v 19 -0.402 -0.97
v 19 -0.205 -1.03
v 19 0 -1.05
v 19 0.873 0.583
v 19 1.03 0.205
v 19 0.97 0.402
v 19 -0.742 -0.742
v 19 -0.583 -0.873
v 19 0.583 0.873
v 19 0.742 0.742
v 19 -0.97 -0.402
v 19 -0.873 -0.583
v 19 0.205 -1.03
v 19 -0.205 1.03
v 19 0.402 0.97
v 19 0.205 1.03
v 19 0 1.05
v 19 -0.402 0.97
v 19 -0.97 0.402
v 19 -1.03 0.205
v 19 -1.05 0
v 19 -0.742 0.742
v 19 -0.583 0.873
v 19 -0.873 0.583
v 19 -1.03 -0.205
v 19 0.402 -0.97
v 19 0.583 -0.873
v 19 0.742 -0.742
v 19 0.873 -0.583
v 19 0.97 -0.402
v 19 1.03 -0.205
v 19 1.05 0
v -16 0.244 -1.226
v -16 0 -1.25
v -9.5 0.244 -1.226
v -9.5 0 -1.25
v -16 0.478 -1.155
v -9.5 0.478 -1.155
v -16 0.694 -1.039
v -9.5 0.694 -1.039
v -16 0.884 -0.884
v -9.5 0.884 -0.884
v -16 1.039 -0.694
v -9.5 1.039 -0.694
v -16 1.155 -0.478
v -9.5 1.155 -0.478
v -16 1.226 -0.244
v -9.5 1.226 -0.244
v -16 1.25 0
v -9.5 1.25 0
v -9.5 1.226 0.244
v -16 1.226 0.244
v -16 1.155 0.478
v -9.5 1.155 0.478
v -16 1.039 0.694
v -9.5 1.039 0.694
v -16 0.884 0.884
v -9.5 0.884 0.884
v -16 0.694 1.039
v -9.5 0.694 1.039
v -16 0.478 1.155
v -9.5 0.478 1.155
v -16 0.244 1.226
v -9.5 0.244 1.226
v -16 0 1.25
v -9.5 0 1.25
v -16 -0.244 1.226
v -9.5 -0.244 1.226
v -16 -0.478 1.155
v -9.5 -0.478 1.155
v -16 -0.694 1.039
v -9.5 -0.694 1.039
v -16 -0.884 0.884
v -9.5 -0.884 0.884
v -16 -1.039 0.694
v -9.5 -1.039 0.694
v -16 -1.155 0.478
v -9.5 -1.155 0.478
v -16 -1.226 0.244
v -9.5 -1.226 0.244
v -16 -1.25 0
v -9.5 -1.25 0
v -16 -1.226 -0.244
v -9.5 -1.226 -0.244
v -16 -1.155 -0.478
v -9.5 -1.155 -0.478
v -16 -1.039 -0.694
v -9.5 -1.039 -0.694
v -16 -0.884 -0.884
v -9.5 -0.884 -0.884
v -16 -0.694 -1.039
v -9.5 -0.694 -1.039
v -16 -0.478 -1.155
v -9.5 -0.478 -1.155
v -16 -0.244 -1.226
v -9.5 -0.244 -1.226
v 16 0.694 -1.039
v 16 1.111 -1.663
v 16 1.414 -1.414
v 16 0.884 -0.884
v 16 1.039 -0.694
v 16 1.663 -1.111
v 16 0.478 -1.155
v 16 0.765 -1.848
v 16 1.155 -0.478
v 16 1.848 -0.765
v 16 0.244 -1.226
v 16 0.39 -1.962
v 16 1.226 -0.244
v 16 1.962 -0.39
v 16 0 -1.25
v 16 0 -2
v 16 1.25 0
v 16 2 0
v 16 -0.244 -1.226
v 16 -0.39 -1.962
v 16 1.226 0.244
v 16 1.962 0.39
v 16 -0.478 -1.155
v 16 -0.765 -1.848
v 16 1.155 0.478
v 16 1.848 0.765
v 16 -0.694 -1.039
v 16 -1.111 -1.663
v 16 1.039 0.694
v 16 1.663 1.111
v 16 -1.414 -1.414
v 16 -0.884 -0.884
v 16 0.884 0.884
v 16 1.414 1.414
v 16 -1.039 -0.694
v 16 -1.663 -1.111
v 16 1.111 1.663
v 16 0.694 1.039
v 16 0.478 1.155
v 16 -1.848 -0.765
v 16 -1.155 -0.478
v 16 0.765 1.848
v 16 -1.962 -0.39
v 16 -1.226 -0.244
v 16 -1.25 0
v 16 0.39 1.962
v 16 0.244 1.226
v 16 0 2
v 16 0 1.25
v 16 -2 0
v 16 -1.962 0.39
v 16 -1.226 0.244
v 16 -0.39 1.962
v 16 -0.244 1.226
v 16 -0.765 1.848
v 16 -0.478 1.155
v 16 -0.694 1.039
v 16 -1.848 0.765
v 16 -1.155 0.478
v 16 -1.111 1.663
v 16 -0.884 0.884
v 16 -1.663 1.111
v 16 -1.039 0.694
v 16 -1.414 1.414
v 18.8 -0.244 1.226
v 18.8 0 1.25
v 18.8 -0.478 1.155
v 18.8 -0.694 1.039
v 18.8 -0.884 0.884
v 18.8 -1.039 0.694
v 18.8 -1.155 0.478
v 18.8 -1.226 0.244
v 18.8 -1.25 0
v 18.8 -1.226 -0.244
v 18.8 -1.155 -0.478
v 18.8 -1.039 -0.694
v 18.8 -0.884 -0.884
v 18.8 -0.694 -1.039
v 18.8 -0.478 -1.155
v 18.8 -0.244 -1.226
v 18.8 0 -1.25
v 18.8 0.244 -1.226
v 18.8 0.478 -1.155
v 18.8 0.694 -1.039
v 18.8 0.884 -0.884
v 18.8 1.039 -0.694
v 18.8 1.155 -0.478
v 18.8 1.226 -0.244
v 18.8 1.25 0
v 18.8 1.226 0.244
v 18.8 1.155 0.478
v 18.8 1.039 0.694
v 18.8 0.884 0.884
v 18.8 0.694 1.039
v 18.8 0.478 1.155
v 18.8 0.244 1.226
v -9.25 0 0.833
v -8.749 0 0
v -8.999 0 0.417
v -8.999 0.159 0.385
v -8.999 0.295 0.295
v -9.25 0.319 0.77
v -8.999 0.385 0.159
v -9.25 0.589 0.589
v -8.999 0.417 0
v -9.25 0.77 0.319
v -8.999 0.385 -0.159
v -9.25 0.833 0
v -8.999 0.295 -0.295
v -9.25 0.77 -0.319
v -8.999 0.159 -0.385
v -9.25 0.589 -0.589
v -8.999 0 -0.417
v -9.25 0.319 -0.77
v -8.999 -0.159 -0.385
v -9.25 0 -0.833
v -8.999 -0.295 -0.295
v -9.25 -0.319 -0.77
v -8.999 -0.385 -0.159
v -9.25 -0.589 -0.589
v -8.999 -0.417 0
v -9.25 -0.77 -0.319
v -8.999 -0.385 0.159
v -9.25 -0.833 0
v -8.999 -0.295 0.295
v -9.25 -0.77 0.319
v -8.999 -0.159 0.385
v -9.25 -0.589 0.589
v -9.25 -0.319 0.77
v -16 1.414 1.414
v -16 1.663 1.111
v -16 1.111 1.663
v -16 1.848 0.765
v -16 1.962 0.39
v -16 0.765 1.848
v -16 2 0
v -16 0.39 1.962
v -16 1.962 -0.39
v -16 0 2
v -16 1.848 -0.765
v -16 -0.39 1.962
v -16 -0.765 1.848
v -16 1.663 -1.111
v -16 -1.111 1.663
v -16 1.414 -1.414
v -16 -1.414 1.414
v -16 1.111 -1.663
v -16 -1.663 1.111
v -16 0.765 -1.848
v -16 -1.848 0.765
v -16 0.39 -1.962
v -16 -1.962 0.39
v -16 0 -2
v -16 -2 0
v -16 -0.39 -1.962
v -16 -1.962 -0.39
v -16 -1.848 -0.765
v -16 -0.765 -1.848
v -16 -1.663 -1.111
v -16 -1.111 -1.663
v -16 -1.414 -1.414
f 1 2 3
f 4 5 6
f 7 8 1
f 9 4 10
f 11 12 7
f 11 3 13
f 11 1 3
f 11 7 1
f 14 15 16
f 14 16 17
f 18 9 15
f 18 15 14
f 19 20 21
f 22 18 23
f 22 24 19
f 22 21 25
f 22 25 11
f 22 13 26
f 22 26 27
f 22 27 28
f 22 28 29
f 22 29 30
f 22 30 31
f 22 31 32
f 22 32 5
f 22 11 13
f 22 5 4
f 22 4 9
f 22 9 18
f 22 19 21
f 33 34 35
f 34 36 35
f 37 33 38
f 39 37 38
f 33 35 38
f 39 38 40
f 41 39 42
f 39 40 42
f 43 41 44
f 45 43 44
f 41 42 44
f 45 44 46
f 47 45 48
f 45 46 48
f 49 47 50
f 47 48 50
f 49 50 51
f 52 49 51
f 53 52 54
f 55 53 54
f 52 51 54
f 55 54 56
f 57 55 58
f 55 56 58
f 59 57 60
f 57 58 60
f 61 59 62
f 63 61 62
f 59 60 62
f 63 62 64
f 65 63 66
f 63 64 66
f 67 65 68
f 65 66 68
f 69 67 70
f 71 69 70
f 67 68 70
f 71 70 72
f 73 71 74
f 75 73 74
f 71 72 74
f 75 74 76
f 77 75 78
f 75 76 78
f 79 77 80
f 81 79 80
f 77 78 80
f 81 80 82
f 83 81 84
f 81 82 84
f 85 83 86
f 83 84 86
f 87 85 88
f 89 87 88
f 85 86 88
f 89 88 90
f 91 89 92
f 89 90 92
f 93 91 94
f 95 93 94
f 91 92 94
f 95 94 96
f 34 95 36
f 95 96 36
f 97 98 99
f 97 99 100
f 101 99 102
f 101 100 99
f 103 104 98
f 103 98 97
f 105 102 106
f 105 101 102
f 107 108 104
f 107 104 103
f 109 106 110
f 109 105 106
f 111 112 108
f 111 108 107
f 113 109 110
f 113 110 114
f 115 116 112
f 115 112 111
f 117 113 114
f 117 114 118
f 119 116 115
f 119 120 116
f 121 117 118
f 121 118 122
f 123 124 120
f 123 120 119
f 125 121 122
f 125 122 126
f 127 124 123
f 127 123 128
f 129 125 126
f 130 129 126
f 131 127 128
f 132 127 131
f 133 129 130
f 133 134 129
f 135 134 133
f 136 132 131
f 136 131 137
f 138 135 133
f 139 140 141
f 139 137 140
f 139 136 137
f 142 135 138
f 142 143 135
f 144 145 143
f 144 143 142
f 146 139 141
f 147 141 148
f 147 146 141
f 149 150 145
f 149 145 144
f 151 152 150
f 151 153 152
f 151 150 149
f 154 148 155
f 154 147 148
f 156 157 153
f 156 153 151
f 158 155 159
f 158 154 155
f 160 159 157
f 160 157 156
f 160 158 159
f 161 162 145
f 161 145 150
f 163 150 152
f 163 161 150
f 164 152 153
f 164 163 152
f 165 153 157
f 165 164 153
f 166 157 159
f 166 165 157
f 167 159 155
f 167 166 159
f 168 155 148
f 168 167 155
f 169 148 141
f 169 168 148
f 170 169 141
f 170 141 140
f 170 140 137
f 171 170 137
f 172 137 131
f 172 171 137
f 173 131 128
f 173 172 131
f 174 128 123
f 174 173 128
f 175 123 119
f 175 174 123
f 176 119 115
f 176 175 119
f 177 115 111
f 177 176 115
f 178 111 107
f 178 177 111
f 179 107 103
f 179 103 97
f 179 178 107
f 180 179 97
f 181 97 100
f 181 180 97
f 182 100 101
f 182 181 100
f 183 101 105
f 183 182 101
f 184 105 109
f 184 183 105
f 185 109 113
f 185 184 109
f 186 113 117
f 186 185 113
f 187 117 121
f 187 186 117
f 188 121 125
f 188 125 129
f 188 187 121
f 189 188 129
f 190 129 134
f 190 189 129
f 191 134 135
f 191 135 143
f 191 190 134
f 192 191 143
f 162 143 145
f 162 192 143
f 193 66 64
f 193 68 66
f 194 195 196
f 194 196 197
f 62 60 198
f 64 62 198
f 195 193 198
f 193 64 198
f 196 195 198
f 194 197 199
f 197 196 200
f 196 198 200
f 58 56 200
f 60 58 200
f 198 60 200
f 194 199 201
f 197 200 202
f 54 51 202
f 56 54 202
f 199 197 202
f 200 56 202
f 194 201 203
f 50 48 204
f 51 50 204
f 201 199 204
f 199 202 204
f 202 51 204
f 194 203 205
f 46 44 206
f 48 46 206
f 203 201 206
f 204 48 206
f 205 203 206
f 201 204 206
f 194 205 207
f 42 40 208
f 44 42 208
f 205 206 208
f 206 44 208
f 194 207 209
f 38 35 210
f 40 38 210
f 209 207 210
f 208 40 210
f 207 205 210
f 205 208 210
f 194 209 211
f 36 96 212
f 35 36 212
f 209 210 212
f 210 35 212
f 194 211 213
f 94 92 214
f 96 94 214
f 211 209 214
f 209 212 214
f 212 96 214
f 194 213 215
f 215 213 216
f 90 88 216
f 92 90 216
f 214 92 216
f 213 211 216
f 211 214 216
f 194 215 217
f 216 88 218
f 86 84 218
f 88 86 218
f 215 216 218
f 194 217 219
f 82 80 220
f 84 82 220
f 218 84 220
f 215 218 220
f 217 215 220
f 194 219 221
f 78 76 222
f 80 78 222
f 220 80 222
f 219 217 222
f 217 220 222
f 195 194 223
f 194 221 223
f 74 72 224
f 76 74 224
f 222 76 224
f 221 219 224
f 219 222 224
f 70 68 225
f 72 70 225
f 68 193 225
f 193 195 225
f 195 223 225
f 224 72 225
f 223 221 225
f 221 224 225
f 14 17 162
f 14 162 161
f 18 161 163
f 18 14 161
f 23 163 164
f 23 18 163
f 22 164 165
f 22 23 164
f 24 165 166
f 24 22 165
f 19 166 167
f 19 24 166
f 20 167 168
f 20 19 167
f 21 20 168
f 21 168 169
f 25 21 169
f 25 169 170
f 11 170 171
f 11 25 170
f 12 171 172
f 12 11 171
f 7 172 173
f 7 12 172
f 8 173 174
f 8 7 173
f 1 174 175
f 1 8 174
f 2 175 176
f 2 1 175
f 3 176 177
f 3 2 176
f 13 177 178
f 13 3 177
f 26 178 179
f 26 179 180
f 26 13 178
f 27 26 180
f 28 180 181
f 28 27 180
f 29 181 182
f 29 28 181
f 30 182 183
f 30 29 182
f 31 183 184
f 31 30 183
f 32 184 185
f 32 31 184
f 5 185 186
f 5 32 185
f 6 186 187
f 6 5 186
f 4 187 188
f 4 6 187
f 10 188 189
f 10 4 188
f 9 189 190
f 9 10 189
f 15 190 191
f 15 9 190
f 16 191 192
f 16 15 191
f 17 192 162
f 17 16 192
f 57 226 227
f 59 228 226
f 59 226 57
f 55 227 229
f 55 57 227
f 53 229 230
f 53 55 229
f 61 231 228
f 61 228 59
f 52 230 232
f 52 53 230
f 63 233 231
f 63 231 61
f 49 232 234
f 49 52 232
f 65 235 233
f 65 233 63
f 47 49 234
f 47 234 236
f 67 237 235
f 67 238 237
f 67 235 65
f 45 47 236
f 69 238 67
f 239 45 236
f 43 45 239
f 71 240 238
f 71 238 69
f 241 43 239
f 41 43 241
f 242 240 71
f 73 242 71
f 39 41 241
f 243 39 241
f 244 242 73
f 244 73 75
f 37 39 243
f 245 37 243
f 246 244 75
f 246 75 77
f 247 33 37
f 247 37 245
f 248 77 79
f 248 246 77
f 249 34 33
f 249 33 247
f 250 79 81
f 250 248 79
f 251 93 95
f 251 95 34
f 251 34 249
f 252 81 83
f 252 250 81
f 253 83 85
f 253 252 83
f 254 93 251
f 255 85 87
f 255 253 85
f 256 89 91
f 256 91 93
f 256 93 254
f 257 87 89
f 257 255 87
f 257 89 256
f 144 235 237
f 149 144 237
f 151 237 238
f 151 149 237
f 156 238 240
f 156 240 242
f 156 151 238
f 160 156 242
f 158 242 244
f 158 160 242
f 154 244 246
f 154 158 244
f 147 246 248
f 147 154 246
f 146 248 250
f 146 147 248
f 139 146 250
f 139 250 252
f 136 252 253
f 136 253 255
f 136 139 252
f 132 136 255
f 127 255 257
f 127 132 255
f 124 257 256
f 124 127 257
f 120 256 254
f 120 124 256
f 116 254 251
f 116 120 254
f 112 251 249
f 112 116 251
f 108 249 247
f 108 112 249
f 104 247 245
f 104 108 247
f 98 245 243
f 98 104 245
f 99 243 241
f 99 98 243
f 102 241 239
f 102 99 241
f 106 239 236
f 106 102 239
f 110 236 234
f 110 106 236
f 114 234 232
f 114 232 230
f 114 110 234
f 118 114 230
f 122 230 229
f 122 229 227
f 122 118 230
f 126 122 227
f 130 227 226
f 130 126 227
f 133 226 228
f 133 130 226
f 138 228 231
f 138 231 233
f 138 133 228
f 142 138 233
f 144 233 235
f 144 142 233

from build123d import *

# Parameters (mm, degrees)
M3_GEWINDEBOHRUNG1_D     = 2.5
M3_GEWINDEBOHRUNG1_DEPTH = 6.5
M3_GEWINDEBOHRUNG1_TIP   = 0.751075774
FASE1_SIZE               = 0.2


with BuildPart() as part:
    # Skizze1 → Rotation1 (revolve)
    with BuildSketch(Plane.XY, mode=Mode.PRIVATE) as rotation1_sk:
        Polygon((19, 0), (-16, 0), (-16, 2), (16, 2), (16, 1.25), (19, 1.25), align=None)
    revolve(rotation1_sk.sketch.rotate(Axis((0, 0, 0), (1, 0, 0)), 90), axis=Axis((0, 0, 0), (1, 0, 0)))

    # M3 Gewindebohrung1
    with Locations(Plane.ZY.offset(16)):
        with Locations((0, 0)):
            Hole(M3_GEWINDEBOHRUNG1_D / 2, depth=M3_GEWINDEBOHRUNG1_DEPTH)
            with Locations((0, 0, -(M3_GEWINDEBOHRUNG1_DEPTH + M3_GEWINDEBOHRUNG1_TIP / 2))):  # 118° drill point
                Cone(0, M3_GEWINDEBOHRUNG1_D / 2, M3_GEWINDEBOHRUNG1_TIP, mode=Mode.SUBTRACT)

    # Fase1
    fase1_edges = [part.edges().sort_by_distance(p)[0] for p in [
        (19, 0, -1.25),
    ]]
    chamfer(fase1_edges, length=FASE1_SIZE)


solid = part.part
